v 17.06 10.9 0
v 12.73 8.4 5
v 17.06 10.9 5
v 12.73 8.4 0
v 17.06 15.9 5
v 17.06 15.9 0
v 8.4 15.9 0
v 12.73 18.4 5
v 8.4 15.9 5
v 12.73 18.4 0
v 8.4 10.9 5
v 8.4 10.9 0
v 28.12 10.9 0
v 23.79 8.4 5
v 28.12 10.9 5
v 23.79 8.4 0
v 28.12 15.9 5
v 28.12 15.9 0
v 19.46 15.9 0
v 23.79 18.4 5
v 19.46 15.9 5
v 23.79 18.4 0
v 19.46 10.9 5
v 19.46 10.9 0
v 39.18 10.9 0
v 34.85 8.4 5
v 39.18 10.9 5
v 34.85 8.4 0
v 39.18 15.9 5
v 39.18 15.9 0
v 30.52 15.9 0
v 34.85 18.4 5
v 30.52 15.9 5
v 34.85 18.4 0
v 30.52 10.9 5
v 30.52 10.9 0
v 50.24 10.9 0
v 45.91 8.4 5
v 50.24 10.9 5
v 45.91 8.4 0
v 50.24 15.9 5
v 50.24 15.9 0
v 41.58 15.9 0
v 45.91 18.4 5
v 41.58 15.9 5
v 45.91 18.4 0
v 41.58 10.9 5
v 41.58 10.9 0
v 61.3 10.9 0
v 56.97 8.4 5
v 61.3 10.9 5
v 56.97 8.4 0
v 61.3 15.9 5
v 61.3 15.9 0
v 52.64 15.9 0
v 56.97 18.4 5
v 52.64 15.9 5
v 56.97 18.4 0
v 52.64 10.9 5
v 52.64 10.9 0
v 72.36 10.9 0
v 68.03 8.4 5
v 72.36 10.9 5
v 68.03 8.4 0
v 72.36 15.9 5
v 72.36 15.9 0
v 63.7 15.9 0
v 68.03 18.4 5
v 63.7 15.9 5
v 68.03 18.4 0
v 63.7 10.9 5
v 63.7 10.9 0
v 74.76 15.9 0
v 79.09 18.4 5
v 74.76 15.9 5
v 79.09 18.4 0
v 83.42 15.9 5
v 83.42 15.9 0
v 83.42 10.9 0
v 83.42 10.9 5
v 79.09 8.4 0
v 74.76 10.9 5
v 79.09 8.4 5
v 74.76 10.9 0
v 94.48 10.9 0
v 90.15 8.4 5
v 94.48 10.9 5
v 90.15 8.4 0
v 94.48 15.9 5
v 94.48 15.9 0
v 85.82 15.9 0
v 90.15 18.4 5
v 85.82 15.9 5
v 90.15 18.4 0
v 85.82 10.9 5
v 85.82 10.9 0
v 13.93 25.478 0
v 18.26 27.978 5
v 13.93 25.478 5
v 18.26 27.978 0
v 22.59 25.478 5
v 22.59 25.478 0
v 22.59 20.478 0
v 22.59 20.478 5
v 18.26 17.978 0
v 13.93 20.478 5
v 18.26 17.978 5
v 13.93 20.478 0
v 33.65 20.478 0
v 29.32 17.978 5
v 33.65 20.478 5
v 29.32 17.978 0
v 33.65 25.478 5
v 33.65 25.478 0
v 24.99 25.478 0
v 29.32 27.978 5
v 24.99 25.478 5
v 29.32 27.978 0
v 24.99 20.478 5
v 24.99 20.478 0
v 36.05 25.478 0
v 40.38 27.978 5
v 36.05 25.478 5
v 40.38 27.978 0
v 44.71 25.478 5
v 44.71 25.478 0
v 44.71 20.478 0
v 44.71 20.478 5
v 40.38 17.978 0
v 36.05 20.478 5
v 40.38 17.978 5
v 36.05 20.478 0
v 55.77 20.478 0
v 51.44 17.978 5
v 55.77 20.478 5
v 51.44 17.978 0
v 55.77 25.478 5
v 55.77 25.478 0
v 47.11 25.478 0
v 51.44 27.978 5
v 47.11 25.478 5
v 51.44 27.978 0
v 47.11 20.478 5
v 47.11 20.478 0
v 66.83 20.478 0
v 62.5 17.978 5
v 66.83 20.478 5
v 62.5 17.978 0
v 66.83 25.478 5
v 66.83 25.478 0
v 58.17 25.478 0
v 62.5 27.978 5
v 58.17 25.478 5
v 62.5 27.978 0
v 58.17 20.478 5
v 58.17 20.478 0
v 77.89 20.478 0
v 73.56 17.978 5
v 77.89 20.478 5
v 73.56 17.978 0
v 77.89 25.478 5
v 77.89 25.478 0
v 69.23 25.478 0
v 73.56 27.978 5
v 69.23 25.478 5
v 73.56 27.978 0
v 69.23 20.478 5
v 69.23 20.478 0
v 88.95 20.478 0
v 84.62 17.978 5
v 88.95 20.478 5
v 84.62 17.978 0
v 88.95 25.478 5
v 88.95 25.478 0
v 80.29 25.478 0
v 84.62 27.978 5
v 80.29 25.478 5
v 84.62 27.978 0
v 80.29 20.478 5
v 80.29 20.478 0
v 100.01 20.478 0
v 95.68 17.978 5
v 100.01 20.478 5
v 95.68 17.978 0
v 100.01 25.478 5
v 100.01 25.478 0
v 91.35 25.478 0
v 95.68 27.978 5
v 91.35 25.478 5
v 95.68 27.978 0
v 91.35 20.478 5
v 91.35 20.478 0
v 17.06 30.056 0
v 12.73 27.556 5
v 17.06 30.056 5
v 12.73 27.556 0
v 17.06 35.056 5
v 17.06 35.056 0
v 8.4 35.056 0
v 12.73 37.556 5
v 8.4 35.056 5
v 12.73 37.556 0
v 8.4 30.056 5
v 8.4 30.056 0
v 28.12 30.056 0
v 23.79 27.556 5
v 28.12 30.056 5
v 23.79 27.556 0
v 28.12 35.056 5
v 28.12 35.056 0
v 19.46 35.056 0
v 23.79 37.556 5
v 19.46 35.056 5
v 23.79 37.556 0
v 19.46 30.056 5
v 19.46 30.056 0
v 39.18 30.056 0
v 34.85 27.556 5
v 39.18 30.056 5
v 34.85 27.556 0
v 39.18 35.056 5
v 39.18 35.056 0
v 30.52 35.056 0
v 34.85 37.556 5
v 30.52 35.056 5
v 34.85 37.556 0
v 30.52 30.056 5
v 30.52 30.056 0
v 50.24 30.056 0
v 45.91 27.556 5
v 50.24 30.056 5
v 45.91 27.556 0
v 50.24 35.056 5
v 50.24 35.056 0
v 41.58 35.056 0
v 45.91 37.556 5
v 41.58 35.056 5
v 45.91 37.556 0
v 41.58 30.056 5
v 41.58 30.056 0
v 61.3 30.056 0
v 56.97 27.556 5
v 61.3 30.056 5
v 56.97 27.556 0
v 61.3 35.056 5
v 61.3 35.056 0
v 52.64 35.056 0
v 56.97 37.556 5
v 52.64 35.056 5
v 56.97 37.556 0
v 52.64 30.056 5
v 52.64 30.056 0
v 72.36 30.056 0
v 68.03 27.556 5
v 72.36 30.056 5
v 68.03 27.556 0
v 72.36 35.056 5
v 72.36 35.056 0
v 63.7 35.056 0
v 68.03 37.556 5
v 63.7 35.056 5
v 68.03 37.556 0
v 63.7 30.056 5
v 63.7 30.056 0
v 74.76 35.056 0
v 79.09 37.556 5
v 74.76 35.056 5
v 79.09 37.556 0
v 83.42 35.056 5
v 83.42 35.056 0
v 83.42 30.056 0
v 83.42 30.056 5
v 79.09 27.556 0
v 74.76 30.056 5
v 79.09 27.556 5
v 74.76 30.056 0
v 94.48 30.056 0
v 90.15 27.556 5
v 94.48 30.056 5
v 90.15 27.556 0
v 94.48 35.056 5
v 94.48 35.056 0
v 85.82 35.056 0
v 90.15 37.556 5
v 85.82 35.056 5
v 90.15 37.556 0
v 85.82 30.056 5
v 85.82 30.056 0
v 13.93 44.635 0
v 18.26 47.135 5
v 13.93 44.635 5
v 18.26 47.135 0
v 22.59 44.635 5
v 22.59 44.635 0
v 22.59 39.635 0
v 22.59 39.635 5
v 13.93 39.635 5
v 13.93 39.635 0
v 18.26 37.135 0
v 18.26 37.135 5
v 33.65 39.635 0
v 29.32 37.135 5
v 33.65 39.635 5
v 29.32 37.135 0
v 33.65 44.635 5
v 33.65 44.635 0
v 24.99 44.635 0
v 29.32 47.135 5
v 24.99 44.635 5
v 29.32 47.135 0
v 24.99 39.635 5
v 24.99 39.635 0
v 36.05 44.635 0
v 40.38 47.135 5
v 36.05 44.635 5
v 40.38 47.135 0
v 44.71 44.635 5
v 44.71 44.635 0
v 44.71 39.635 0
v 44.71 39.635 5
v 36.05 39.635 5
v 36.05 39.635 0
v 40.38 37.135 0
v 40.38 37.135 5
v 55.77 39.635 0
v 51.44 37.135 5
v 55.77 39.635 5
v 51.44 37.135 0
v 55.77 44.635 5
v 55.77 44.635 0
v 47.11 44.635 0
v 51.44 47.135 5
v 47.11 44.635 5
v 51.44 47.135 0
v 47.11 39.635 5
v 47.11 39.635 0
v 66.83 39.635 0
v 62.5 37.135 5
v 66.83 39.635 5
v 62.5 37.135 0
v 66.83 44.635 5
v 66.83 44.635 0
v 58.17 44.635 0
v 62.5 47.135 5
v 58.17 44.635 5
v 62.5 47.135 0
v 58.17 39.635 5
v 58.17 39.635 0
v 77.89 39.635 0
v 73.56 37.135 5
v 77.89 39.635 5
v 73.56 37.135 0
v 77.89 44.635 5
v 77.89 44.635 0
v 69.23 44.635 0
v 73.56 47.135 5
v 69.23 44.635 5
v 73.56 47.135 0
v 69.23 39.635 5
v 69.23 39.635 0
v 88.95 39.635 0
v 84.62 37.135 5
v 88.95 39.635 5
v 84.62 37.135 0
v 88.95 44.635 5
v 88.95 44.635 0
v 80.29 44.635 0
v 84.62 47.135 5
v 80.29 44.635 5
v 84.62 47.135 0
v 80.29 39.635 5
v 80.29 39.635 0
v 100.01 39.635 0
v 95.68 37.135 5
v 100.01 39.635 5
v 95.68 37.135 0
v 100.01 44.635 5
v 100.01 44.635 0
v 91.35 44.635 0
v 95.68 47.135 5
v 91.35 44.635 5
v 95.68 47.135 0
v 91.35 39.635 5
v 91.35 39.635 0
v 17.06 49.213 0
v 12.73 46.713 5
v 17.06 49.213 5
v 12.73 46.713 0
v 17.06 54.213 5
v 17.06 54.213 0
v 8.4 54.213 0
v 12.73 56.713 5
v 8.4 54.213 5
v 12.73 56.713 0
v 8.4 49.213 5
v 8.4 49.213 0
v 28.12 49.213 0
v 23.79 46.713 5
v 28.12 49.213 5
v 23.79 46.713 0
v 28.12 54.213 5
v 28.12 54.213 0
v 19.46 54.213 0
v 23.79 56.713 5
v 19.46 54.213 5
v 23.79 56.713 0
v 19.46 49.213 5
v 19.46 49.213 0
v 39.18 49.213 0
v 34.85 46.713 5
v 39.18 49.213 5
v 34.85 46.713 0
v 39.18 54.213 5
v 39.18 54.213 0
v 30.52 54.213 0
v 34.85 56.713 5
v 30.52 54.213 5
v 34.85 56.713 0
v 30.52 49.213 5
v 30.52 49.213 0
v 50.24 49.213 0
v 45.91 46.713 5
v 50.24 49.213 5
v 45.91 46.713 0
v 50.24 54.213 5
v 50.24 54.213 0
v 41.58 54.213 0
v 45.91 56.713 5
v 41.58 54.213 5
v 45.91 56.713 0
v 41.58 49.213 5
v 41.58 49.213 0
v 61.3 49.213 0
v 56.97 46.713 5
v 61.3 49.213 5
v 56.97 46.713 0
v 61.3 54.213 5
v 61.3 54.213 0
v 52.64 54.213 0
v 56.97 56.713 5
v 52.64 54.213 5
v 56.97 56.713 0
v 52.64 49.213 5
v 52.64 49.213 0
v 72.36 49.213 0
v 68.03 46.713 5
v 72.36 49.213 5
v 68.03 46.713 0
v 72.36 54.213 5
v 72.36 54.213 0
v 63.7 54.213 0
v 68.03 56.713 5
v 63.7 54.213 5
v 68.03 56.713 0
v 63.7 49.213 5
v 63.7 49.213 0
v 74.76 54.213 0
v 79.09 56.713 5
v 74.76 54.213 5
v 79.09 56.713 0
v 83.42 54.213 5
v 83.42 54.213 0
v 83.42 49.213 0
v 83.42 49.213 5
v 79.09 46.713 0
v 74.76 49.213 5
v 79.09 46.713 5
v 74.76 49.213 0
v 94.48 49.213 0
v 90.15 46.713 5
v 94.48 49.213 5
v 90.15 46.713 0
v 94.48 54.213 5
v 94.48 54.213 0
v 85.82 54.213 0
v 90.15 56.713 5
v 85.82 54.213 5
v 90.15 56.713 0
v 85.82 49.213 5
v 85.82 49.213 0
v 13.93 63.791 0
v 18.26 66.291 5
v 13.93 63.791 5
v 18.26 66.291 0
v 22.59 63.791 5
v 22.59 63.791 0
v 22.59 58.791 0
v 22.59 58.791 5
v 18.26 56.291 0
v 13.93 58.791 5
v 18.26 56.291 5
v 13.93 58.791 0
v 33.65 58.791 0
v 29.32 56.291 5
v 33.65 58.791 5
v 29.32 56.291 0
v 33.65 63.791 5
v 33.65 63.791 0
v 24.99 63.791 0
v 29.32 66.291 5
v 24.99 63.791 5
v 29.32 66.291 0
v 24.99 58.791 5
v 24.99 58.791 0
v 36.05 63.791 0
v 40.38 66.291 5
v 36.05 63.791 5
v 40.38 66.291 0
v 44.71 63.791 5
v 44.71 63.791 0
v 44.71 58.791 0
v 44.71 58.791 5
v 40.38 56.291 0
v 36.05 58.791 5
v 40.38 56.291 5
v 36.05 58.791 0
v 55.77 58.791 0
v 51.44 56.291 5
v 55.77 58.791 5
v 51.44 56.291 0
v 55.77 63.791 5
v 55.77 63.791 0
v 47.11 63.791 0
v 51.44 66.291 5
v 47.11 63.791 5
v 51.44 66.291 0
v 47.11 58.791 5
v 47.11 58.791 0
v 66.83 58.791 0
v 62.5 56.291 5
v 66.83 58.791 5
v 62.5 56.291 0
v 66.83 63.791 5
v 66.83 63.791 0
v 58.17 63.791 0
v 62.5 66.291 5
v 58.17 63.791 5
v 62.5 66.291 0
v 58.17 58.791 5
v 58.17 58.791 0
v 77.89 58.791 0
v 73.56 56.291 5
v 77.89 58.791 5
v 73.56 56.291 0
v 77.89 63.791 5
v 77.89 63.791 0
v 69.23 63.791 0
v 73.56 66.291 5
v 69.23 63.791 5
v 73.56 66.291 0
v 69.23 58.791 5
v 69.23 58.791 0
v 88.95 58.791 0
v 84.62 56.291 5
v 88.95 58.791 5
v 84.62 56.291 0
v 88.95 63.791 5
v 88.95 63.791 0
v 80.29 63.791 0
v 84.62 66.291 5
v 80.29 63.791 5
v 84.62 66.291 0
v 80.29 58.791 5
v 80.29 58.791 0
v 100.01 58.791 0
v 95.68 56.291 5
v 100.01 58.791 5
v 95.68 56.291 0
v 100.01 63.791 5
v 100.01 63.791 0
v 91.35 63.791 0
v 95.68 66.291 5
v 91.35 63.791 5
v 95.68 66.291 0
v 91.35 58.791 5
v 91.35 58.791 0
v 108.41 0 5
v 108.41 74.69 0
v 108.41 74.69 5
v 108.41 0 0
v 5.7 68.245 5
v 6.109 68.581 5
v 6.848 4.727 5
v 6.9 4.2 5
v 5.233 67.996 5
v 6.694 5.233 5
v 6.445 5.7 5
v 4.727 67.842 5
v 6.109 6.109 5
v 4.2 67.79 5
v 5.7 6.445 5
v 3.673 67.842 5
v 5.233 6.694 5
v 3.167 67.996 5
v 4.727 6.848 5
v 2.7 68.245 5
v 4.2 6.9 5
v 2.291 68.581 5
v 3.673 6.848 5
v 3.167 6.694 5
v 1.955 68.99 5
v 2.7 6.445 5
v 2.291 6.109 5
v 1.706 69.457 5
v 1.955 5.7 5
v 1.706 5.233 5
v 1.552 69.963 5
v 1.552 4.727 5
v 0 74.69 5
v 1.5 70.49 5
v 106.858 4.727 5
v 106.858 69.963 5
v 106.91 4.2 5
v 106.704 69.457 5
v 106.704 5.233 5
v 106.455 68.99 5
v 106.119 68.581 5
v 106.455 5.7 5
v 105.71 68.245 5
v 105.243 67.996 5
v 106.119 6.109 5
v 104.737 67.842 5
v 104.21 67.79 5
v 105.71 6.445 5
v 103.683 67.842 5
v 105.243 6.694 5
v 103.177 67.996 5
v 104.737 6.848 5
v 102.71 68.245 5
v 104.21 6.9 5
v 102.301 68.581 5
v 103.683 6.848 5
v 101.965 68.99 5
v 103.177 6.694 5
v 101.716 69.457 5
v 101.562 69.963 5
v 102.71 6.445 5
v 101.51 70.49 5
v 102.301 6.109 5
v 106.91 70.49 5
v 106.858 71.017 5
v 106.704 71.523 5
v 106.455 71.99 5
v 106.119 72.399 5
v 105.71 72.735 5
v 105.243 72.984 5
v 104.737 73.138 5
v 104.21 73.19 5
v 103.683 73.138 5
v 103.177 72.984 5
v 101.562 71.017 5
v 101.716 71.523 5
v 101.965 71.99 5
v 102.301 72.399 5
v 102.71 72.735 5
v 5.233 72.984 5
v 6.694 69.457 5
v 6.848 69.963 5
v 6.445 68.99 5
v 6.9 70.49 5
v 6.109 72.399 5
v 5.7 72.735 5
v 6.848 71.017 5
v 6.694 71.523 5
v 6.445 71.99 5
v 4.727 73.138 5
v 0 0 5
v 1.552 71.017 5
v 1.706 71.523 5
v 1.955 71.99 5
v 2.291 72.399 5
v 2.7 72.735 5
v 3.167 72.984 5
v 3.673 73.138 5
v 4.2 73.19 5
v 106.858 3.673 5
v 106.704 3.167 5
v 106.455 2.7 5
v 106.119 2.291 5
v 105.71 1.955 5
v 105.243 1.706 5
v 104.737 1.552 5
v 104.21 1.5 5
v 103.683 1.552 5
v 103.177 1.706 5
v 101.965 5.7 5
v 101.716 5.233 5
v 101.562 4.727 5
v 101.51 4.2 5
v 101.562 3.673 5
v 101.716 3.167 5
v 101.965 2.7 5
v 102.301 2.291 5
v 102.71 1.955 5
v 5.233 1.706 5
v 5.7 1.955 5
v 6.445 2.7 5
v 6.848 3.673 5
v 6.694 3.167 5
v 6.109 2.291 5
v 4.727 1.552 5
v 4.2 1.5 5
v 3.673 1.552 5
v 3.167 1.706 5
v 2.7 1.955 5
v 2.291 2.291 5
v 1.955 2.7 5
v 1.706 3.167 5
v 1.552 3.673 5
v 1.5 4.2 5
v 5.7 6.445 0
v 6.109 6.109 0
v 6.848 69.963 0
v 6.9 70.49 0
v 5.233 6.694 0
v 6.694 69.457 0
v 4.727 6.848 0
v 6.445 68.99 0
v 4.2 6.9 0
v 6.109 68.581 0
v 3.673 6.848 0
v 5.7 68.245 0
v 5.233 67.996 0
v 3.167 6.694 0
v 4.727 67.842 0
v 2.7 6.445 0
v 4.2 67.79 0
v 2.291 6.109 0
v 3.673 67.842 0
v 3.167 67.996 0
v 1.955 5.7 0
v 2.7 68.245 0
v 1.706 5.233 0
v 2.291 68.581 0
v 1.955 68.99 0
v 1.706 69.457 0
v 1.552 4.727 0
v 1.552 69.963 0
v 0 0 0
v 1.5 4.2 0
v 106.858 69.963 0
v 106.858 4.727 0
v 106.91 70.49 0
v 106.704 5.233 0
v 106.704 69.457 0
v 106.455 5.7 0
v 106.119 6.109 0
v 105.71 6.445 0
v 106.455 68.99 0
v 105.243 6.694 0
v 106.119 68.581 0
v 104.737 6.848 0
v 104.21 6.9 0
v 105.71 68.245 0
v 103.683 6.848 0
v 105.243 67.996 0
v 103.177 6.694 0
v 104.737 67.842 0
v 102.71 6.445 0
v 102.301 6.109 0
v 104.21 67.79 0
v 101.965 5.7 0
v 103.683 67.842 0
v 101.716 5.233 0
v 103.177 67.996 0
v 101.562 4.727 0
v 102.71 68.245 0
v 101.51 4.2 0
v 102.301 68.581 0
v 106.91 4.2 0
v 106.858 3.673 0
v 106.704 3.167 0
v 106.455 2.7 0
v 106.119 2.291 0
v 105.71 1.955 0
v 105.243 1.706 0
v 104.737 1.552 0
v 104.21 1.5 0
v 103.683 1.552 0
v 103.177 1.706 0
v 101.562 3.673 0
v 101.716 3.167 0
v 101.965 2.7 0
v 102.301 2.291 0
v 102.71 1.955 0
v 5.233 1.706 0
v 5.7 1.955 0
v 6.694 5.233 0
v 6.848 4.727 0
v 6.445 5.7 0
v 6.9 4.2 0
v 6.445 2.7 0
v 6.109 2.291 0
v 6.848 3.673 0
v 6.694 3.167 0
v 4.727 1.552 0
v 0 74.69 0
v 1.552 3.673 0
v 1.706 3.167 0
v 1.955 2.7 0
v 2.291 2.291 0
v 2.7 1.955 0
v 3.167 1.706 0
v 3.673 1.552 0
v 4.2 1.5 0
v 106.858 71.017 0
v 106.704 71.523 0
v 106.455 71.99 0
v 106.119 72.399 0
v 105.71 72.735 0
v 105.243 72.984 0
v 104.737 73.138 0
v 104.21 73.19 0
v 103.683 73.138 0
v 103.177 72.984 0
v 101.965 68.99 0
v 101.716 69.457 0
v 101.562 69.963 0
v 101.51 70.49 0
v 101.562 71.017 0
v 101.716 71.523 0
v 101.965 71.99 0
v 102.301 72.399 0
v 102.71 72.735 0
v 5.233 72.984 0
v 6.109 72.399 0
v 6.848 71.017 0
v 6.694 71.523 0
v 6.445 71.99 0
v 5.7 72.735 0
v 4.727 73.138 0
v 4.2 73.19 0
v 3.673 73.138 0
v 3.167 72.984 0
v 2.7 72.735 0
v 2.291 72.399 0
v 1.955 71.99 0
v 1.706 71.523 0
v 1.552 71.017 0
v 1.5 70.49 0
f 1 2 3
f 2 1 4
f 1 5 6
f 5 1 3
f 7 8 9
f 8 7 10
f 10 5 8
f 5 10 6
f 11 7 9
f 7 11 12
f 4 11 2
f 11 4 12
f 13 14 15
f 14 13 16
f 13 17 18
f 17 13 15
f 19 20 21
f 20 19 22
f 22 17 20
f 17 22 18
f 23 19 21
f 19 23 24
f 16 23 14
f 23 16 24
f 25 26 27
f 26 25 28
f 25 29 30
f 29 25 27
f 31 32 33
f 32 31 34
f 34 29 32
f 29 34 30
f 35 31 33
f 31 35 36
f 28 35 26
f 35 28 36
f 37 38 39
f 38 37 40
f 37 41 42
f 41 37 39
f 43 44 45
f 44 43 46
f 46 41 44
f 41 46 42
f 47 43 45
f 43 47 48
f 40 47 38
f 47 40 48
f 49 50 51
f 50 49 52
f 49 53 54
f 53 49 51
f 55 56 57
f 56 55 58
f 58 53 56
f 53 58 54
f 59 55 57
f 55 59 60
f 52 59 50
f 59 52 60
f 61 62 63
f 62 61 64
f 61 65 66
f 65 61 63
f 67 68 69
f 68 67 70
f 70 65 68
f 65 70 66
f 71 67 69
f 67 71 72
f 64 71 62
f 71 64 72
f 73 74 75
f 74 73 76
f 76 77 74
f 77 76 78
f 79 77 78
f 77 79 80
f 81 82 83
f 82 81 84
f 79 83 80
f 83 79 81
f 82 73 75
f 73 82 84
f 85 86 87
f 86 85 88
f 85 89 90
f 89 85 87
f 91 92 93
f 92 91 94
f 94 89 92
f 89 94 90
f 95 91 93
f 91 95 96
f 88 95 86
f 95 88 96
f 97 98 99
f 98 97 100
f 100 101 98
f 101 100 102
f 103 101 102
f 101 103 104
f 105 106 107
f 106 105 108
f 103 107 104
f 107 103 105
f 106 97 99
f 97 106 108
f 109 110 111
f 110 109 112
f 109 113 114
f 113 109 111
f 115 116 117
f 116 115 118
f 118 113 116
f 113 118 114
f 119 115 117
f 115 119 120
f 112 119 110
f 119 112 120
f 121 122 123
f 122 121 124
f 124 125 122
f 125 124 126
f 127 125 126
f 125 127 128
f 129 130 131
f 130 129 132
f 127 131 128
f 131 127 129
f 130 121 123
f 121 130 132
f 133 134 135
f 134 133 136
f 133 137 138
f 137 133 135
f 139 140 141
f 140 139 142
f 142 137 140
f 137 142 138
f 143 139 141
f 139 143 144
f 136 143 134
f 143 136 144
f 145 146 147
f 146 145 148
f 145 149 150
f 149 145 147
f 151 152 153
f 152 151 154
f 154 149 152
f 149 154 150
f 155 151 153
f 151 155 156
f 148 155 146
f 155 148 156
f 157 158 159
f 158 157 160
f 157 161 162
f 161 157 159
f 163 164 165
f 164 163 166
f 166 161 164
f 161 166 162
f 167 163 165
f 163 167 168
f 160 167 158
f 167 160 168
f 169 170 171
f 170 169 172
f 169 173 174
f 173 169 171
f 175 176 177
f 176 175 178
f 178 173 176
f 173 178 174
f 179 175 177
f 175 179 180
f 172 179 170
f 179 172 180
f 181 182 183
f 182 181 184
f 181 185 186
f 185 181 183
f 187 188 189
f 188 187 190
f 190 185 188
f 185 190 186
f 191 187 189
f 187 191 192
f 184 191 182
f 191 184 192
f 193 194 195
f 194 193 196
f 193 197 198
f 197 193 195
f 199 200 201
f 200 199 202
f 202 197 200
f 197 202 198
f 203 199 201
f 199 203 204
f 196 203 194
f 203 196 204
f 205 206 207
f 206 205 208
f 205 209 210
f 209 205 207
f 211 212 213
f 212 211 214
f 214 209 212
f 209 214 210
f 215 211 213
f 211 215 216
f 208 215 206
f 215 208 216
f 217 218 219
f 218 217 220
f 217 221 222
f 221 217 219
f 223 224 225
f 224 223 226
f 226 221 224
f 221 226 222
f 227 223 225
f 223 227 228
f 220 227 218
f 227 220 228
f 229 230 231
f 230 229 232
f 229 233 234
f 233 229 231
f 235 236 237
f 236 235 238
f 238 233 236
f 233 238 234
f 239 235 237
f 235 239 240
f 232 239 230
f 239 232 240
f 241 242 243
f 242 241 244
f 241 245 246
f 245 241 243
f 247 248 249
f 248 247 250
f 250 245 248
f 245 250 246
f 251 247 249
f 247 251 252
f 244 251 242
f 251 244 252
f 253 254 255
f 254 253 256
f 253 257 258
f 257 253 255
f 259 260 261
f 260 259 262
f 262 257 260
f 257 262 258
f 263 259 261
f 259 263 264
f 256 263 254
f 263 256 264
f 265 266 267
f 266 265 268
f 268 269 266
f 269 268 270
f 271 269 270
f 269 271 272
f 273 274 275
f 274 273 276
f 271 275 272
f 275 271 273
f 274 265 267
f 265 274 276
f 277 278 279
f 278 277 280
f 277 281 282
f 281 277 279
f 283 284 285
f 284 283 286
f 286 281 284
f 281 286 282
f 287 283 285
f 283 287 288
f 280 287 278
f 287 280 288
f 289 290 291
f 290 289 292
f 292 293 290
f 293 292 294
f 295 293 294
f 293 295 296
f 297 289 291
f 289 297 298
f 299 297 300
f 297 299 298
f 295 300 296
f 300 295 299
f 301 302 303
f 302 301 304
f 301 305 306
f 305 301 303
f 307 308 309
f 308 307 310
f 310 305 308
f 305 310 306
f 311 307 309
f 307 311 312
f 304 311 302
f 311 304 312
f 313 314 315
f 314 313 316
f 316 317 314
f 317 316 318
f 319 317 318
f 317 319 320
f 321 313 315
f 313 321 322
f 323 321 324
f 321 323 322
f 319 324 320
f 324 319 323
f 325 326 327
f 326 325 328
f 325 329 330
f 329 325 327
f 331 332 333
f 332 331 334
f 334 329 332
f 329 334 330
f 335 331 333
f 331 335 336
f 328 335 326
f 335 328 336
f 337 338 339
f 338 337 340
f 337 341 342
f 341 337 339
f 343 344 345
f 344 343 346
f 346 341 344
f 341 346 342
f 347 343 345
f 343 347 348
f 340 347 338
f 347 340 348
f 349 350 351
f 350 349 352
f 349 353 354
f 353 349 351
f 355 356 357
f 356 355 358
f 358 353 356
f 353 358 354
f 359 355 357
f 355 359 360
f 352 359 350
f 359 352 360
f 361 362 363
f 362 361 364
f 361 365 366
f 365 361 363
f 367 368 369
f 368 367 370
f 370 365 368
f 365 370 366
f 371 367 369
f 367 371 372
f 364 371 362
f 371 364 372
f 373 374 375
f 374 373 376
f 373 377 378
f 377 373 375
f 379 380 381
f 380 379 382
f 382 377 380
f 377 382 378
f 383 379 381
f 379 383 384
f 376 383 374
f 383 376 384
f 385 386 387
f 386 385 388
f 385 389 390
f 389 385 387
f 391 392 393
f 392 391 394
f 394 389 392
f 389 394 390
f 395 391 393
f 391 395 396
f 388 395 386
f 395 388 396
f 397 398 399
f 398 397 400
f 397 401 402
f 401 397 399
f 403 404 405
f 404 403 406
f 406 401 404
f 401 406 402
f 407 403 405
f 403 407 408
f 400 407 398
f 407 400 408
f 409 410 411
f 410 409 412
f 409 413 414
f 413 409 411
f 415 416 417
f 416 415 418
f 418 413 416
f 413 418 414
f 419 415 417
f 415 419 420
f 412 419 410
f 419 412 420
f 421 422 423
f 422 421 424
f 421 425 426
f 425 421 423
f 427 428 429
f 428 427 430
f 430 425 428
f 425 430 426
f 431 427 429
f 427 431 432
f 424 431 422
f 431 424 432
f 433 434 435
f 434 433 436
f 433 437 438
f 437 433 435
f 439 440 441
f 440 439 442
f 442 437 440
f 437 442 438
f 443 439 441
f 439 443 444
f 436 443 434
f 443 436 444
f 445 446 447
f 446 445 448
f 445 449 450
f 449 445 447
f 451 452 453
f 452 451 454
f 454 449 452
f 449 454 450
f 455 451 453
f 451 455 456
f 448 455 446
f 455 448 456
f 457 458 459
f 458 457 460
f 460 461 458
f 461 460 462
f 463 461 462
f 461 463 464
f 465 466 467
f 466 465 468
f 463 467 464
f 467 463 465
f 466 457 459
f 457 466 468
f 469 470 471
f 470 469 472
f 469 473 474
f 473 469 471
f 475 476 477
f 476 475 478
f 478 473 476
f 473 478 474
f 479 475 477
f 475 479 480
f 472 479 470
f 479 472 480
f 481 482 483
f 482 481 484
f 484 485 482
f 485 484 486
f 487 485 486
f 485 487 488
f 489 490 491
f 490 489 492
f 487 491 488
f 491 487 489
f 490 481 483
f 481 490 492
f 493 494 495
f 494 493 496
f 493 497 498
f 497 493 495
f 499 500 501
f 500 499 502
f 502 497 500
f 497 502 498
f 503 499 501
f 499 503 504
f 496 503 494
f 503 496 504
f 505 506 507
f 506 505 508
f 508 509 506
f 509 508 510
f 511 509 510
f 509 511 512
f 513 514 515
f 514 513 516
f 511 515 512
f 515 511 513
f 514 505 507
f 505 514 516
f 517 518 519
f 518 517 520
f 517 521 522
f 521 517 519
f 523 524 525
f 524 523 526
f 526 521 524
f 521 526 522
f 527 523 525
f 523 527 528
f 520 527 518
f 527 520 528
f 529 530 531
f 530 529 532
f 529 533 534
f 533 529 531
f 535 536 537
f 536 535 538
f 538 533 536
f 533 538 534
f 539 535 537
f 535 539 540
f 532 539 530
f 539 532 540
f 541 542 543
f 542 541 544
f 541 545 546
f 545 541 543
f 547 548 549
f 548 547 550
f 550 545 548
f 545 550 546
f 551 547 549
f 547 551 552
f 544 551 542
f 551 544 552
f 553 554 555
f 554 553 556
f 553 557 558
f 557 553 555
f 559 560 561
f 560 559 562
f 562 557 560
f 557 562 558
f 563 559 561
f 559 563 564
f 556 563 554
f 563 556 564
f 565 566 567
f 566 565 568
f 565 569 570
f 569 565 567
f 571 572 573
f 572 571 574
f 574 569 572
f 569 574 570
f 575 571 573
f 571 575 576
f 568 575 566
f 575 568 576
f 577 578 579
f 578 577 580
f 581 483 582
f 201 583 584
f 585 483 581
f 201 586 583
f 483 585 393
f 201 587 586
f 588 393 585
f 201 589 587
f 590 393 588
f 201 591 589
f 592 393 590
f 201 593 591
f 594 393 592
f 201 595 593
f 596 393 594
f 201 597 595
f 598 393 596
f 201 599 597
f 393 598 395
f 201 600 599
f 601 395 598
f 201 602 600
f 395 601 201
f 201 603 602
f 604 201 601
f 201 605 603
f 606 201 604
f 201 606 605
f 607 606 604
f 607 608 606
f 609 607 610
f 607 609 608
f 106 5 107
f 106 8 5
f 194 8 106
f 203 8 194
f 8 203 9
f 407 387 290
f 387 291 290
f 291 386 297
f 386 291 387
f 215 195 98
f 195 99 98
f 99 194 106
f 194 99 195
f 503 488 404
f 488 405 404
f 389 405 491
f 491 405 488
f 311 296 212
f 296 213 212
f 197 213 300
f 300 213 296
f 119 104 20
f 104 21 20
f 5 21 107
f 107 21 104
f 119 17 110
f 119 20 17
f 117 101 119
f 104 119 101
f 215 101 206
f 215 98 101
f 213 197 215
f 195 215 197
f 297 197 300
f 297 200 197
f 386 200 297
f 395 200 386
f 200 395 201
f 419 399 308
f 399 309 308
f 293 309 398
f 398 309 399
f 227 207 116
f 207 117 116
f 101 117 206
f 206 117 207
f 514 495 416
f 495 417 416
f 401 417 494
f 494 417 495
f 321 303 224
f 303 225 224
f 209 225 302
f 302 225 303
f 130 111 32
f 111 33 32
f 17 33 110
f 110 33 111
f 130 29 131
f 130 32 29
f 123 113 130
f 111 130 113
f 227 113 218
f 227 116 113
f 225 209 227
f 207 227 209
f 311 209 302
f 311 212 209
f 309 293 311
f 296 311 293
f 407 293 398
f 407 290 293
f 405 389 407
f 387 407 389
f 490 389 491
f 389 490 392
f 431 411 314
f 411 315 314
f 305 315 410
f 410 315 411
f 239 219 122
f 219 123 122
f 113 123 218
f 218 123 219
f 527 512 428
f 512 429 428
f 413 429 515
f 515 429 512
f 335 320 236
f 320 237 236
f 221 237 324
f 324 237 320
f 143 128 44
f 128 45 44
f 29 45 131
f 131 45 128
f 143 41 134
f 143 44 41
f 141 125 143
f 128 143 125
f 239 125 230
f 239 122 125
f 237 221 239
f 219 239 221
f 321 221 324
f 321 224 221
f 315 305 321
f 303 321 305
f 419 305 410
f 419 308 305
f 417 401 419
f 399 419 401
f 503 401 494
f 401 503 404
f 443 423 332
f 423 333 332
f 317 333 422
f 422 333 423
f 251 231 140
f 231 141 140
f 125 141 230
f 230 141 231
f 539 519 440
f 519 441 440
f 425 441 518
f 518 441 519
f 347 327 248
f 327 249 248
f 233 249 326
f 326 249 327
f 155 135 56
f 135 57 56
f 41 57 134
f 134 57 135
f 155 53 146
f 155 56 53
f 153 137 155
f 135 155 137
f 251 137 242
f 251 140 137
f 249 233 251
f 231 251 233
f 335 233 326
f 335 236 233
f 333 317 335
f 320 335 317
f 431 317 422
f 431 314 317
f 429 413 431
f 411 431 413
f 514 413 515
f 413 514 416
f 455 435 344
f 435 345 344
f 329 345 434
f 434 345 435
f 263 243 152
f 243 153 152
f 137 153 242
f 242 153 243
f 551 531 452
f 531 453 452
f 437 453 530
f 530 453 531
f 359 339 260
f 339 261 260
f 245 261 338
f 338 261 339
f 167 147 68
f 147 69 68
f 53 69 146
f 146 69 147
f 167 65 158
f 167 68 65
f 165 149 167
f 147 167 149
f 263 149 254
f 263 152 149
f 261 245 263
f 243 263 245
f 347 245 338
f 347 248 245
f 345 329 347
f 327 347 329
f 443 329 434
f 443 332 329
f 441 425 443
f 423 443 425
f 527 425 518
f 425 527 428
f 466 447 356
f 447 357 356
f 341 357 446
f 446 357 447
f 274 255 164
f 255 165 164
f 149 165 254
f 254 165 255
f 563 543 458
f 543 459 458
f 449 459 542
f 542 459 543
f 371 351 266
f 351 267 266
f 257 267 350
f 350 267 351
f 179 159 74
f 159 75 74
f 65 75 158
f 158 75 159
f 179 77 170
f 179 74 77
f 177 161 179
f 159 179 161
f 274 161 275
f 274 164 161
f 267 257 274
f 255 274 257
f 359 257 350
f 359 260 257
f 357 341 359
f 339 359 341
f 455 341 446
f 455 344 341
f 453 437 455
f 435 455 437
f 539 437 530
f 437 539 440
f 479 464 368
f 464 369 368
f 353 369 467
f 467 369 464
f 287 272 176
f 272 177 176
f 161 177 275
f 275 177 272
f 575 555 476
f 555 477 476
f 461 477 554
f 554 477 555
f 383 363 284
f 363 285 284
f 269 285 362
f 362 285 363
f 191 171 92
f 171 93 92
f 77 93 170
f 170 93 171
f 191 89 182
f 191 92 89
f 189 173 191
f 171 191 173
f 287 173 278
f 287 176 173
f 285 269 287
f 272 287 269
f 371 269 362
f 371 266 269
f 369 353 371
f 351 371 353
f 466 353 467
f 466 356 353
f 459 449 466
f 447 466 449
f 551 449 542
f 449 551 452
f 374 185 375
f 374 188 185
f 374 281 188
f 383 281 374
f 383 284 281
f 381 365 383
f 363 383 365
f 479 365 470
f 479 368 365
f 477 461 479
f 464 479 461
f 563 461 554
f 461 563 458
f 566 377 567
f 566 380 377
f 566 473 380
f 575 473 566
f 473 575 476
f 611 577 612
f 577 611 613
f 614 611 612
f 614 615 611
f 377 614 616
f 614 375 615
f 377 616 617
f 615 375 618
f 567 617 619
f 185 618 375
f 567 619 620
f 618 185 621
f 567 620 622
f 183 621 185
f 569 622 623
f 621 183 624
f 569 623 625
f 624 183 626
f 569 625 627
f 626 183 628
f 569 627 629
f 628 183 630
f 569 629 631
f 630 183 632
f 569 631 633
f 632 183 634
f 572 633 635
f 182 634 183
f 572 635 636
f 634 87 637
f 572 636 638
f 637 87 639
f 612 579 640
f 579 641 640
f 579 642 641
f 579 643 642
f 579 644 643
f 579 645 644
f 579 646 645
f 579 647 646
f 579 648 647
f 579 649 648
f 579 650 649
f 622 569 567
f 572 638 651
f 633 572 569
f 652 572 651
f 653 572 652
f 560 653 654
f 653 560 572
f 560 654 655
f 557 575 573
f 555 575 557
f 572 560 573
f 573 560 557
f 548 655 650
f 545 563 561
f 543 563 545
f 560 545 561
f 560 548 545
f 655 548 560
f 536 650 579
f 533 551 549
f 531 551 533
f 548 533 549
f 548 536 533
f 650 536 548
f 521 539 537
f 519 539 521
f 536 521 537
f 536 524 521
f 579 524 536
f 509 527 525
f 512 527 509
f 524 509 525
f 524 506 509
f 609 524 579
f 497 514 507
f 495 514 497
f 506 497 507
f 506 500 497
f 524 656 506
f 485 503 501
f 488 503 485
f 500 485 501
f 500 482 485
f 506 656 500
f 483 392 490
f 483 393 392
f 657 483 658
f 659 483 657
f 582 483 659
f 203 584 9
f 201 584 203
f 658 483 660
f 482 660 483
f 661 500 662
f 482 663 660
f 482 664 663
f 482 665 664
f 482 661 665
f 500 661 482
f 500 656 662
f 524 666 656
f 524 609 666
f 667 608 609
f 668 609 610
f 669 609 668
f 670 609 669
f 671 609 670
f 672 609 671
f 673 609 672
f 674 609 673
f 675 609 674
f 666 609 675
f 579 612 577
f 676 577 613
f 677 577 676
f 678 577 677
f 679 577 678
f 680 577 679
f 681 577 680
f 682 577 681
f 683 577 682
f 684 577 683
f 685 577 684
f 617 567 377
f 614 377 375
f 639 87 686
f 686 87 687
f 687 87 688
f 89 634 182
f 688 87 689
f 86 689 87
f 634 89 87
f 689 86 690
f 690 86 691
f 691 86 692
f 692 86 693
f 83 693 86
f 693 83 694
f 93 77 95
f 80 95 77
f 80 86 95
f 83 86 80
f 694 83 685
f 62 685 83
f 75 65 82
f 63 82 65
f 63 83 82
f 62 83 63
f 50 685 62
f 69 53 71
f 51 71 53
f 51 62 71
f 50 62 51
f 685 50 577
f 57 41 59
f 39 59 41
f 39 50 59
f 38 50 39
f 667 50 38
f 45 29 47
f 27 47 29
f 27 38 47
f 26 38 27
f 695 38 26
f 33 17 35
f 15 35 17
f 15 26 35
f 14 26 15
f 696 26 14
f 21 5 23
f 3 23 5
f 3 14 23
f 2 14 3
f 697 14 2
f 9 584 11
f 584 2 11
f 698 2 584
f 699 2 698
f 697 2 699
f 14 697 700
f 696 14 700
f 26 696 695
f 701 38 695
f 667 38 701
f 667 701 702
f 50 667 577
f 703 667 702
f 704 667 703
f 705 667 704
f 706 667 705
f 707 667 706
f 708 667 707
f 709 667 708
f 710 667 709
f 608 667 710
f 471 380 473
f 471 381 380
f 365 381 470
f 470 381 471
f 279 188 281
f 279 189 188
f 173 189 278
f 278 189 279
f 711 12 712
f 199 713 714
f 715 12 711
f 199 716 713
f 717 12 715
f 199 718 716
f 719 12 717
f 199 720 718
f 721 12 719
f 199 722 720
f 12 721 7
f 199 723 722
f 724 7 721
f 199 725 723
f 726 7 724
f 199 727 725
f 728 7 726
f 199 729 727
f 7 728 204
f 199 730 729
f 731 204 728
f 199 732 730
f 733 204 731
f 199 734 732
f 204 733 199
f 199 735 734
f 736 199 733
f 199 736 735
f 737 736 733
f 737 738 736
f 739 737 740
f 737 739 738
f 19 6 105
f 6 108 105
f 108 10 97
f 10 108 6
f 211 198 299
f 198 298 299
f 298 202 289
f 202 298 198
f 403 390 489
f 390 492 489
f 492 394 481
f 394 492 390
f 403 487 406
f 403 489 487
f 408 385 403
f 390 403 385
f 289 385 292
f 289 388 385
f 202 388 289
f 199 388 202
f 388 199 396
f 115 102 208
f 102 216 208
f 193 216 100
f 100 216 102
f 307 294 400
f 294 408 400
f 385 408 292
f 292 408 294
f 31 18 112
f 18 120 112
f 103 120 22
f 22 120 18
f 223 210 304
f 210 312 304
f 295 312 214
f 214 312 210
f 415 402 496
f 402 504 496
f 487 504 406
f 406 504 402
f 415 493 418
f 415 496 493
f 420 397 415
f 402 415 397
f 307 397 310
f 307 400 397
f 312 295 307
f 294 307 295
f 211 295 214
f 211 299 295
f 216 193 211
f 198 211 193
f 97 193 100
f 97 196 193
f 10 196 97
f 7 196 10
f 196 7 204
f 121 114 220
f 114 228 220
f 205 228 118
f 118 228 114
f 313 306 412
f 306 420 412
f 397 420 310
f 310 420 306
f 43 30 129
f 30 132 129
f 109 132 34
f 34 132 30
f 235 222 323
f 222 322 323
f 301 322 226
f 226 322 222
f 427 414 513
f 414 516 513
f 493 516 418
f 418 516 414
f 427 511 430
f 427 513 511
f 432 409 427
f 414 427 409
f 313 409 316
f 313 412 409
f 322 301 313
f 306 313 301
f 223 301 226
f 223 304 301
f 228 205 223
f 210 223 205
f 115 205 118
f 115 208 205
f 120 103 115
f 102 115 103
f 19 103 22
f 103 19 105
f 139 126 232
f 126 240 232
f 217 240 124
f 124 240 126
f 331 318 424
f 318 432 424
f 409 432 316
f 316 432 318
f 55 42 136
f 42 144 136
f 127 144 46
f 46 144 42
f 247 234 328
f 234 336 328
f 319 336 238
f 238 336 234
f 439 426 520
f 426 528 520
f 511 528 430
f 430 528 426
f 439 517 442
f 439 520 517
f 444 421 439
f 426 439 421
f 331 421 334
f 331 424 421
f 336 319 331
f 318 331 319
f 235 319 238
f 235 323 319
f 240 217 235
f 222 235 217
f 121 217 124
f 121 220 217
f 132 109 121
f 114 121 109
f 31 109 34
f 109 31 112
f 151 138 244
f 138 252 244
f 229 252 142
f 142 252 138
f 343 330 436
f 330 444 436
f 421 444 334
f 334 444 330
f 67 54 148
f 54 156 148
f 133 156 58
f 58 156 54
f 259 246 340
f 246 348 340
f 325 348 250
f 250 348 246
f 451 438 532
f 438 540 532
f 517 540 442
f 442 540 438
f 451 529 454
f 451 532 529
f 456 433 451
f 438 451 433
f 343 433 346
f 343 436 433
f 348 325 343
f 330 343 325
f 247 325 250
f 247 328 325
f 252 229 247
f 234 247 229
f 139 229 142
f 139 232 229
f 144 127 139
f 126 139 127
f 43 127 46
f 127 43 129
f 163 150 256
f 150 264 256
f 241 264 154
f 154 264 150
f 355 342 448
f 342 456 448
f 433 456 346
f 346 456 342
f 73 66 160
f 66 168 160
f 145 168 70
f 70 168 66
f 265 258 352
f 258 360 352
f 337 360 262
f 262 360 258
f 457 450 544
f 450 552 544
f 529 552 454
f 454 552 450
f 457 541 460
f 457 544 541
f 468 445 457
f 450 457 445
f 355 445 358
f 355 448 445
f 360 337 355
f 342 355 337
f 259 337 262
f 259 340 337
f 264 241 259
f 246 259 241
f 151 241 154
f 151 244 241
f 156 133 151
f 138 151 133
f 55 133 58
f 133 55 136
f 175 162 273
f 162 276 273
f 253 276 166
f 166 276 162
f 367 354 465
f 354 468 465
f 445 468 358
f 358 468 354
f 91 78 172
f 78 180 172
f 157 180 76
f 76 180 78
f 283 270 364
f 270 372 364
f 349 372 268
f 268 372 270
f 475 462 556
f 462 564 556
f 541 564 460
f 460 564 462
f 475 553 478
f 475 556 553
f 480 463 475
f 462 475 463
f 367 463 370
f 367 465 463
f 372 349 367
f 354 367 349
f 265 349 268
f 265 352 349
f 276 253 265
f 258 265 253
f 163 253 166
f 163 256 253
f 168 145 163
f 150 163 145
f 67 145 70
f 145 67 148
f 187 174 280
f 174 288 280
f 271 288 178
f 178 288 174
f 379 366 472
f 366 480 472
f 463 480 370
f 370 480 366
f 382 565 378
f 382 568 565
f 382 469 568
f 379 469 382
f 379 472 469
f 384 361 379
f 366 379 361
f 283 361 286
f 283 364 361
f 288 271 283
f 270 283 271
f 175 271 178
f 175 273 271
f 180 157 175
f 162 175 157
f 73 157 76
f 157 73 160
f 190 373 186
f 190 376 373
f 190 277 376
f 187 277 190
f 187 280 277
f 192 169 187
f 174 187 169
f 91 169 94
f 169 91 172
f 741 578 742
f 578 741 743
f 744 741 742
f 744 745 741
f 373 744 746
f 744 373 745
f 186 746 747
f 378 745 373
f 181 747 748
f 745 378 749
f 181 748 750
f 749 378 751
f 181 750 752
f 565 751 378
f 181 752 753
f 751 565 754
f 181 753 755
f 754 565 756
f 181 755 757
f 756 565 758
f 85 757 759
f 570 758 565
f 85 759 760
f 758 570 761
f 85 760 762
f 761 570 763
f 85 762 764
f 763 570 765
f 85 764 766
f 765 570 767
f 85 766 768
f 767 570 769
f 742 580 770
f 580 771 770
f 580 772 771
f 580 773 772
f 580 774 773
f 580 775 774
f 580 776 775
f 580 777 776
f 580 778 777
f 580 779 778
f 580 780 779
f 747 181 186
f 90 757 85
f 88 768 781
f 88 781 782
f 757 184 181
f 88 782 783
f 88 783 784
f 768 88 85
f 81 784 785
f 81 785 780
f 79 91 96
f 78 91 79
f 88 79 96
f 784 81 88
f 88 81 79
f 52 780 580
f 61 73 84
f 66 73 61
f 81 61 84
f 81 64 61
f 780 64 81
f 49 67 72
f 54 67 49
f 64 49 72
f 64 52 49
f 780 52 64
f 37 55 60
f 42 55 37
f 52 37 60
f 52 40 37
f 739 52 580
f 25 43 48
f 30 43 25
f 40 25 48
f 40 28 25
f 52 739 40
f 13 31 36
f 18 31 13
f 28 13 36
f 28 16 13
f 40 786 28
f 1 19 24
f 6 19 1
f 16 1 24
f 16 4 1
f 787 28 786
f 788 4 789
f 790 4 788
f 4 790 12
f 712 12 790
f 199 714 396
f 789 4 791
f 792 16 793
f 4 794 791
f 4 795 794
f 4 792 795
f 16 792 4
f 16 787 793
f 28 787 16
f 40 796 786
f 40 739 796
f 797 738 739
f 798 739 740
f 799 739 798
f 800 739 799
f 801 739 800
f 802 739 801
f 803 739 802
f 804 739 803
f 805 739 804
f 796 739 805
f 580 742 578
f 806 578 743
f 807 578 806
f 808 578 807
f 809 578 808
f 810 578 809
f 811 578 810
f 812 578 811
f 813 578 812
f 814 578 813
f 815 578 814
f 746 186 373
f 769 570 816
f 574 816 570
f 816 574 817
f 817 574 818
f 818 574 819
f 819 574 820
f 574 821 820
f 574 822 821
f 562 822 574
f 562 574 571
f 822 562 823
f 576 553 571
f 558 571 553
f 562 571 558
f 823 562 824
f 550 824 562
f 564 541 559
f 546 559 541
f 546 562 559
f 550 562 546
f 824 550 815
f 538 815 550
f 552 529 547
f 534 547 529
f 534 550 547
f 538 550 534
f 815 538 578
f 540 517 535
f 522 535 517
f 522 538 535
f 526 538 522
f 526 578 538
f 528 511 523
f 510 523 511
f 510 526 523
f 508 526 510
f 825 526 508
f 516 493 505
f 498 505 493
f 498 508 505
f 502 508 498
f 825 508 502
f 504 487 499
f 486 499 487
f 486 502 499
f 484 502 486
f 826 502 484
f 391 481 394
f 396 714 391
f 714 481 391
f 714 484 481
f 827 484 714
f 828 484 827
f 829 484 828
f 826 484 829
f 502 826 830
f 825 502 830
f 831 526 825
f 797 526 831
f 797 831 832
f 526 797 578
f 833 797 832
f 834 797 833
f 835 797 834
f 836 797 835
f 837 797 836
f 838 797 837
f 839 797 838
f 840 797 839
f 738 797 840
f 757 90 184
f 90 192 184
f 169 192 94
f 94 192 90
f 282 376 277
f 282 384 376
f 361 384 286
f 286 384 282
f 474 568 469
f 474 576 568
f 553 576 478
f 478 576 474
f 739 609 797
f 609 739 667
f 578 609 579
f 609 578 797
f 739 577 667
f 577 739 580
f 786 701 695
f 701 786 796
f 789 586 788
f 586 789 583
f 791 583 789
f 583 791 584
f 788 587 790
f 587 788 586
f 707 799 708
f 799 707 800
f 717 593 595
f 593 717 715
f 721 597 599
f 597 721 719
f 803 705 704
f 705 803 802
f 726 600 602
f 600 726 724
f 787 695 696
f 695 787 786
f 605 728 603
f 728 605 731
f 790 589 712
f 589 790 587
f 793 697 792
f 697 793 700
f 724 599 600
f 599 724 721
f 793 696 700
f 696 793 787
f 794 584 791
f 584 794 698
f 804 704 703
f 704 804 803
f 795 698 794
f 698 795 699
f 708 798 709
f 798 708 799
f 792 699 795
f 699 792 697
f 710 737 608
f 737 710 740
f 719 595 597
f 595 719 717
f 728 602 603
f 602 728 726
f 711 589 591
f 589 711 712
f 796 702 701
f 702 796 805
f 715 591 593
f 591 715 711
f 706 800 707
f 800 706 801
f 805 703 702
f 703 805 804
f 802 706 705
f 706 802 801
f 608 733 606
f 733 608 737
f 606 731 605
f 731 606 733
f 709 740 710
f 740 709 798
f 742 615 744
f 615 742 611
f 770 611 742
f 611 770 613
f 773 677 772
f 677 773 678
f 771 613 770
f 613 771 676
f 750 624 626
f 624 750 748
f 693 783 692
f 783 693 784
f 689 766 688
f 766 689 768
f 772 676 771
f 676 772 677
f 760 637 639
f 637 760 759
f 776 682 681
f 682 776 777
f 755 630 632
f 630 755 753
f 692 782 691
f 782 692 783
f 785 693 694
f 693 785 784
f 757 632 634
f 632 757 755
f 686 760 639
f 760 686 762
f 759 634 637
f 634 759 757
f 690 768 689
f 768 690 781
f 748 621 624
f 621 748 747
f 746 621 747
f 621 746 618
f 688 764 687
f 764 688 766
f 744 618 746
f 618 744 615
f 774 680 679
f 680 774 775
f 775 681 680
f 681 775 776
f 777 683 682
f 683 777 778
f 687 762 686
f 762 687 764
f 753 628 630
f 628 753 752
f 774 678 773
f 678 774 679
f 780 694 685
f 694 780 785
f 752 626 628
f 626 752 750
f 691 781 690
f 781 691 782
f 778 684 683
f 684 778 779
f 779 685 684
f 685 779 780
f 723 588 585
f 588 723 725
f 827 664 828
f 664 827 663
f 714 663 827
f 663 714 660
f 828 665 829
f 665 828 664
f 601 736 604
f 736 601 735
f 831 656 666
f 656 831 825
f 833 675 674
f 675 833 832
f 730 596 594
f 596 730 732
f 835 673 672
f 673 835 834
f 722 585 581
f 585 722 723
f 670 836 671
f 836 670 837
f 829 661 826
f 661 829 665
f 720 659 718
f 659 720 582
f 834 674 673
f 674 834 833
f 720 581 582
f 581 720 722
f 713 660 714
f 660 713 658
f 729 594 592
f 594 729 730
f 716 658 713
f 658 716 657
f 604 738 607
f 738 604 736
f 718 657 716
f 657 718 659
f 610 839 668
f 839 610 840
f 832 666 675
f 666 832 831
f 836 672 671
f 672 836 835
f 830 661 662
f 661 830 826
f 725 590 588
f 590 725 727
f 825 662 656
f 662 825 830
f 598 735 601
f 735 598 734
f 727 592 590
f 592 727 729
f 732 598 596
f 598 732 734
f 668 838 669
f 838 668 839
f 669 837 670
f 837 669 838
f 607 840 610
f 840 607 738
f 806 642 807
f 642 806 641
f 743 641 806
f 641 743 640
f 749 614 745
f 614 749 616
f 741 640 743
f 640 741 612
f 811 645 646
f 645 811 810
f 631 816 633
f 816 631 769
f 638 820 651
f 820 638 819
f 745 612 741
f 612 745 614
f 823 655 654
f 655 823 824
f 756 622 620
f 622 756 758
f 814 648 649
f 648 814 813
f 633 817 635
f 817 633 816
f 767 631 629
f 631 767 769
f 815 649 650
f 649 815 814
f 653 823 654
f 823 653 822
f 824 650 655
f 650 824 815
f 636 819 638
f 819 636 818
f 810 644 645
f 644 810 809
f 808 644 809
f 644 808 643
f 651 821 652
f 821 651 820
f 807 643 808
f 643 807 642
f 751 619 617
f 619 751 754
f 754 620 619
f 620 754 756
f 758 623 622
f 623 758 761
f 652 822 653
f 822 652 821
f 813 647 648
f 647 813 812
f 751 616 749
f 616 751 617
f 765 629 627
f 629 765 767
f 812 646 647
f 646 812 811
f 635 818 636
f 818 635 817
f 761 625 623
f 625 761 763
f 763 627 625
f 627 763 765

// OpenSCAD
$fn = 32;

// ----------------------------------------------------------------------
// Honeycomb panel: 108.41 x 74.69 mm, 48 cells of 10 mm
// ----------------------------------------------------------------------

// --- parameters (mm) ---
panel_w = 108.41;         // panel width
panel_d = 74.69;          // panel depth
thick = 5;                // panel thickness
cell_r = 5;               // hex cell circumradius
pitch = 11.06;            // hex cell pitch (centre to centre)
web = 2.4;                // web between the cells
columns = 8;              // columns of cells
rows = 6;                 // rows of cells
cell_count = 48;          // total cells
shift_x = 12.73;          // first cell offset in x
shift_y = 13.4;           // first cell offset in y
mount_d = 5.4;            // corner mounting holes
hole_off = 4.2;           // mounting hole offset from the corners

difference() {
  union() {
    cube([panel_w, panel_d, thick]);
  }
  /* hexagonal cells, point-up, cut right through the plate */
  for (row = [0 : rows - 1]) {
    for (col = [0 : columns - 1]) {
      translate([shift_x + col * pitch + (row % 2) * pitch / 2, shift_y + row * pitch * 0.866025, -2.5]) rotate([0, 0, 30]) cylinder(h = thick + 5, d = 2 * cell_r, $fn = 6);
    }
  }
  /* corner mounting holes, clear of the outer cell web */
  translate([4.2, 4.2, -2.5]) cylinder(h = thick + 5, d = mount_d);
  translate([104.21, 4.2, -2.5]) cylinder(h = thick + 5, d = mount_d);
  translate([4.2, 70.49, -2.5]) cylinder(h = thick + 5, d = mount_d);
  translate([104.21, 70.49, -2.5]) cylinder(h = thick + 5, d = mount_d);
}
